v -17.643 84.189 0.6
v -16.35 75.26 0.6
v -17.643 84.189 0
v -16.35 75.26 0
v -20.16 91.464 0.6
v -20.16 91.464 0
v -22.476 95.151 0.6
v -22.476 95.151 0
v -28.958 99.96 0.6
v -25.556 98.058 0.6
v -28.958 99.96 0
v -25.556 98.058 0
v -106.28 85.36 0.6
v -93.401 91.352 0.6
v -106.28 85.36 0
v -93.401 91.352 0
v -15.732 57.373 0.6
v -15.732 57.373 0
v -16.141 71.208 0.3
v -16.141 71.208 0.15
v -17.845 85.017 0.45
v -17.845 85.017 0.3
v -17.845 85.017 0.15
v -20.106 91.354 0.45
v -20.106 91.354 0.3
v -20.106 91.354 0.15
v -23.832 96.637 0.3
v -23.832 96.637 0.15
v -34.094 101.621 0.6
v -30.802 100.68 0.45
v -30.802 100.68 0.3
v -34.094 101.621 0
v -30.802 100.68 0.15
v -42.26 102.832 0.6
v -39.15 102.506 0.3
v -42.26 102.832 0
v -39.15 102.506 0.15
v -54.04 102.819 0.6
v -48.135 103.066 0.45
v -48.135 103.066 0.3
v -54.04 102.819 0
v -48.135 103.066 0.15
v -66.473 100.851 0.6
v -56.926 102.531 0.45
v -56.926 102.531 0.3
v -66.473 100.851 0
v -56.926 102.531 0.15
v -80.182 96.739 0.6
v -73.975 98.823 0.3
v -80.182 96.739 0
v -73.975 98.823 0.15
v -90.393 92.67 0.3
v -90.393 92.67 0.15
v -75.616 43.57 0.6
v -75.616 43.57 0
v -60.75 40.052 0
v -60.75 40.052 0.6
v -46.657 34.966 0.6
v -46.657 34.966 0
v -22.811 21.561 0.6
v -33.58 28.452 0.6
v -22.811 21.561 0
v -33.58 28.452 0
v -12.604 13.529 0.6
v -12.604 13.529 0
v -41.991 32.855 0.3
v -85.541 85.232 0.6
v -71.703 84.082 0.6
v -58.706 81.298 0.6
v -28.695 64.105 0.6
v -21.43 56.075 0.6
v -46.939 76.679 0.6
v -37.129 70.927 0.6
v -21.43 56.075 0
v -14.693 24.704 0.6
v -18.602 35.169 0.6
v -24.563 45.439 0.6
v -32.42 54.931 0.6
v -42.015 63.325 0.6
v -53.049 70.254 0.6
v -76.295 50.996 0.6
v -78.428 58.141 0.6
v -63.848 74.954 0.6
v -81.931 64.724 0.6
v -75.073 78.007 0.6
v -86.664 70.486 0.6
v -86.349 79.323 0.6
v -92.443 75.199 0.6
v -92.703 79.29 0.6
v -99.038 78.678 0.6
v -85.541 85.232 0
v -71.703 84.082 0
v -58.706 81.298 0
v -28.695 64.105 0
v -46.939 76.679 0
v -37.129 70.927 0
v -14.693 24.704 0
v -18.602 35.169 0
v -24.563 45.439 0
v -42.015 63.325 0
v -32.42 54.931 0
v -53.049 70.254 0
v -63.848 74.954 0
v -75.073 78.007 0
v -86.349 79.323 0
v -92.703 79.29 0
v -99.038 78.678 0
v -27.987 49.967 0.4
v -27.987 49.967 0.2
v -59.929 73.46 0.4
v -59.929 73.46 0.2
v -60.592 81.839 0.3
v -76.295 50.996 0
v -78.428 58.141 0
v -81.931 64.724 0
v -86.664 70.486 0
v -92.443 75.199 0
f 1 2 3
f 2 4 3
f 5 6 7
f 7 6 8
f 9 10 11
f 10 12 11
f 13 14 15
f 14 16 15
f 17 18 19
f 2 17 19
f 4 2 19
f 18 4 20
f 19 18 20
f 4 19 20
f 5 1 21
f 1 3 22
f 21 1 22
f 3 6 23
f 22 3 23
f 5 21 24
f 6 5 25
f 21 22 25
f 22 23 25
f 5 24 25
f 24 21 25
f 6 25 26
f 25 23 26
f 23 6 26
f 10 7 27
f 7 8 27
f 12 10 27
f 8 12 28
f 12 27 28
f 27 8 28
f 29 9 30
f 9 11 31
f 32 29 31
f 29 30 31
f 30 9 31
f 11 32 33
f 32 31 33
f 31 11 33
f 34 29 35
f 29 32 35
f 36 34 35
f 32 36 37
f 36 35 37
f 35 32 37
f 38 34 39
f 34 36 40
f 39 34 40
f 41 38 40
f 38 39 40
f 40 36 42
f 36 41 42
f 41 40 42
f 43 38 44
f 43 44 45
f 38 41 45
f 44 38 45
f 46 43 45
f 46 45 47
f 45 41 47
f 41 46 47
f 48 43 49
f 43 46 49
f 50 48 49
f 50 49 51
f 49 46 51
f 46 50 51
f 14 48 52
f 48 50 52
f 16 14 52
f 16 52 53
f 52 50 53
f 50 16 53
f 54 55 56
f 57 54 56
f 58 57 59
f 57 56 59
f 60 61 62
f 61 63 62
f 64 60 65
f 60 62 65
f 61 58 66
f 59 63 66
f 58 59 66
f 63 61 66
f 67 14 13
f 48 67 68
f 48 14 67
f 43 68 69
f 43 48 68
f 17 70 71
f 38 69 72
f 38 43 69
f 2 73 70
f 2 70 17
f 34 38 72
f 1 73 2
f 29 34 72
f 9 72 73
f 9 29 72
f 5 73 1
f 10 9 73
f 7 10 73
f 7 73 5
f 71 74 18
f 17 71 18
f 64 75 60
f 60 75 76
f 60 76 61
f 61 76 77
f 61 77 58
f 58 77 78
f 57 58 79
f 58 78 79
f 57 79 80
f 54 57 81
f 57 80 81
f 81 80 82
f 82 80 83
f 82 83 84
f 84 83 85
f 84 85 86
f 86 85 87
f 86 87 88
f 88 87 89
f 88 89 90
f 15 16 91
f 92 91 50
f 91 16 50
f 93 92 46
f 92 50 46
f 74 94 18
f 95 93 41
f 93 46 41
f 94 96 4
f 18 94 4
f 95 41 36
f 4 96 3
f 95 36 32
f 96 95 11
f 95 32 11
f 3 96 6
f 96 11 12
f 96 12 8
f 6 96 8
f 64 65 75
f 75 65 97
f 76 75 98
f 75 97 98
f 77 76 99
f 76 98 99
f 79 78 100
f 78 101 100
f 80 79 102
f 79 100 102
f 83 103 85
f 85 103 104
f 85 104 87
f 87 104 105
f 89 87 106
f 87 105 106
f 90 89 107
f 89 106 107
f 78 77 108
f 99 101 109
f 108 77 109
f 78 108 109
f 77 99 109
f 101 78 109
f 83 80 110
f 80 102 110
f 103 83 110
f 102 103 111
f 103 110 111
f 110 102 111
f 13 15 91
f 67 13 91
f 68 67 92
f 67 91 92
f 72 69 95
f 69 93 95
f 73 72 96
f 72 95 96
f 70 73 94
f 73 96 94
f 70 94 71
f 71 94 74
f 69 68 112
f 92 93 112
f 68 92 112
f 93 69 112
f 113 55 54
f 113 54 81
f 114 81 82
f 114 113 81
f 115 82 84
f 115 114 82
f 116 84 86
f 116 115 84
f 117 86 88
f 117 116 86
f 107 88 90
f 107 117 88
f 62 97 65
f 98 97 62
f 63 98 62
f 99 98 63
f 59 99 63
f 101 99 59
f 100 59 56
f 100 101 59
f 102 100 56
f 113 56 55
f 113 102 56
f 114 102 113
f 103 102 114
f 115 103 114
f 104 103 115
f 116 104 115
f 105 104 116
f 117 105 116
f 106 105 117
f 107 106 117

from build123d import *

# Parameters (mm, degrees)
EXTRUDE_1_DEPTH   = 0.6
EXTRUDE_1_2_DEPTH = 0.6


with BuildPart() as part:
    # 草图1 → 凸台-拉伸1 (new body)
    with BuildSketch(Plane.XY):
        with BuildLine():
            Line((-21.430428591, 56.075265565), (-15.732435604, 57.372536979))
            add(Edge.make_bspline(
                [(-15.732435604, 57.372536979), (-16.352874844, 66.617684038), (-15.094128925, 80.14081547), (-23.052895127, 99.154839521), (-58.218524544, 108.015164997), (-85.408309672, 95.303557212), (-106.280242174, 85.360474504)],
                knots=[0, 0, 0, 0, 0.217981109, 0.320733404, 0.44968682, 1, 1, 1, 1], degree=3))
            add(Edge.make_bspline(
                [(-106.280242174, 85.360474504), (-91.185245566, 85.415567905), (-59.053058909, 86.36016946), (-31.088236286, 68.673203369), (-21.430428591, 56.075265565)],
                knots=[0, 0, 0, 0, 0.491735089, 1, 1, 1, 1], degree=3))
        make_face()
    extrude(amount=EXTRUDE_1_DEPTH)


with BuildPart() as body_2:
    # 草图1 → Extrude 1 2 (new body)
    with BuildSketch(Plane.XY):
        with BuildLine():
            ThreePointArc((-75.615874929, 43.570118882), (-81.930733792, 64.724394407), (-99.038309587, 78.678306615))
            add(Edge.make_bspline(
                [(-12.604061511, 13.528549047), (-16.576330828, 54.663156355), (-59.476193489, 84.373919061), (-99.038309587, 78.678306615)],
                knots=[0, 0, 0, 0, 1, 1, 1, 1], degree=3))
            add(Edge.make_bspline(
                [(-75.615874929, 43.570118882), (-39.87136374, 37.161531029), (-12.604061511, 13.528549047)],
                knots=[0, 0, 0, 1, 1, 1], degree=2))
        make_face()
    extrude(amount=EXTRUDE_1_2_DEPTH)


solid = Compound([part.part, body_2.part])
